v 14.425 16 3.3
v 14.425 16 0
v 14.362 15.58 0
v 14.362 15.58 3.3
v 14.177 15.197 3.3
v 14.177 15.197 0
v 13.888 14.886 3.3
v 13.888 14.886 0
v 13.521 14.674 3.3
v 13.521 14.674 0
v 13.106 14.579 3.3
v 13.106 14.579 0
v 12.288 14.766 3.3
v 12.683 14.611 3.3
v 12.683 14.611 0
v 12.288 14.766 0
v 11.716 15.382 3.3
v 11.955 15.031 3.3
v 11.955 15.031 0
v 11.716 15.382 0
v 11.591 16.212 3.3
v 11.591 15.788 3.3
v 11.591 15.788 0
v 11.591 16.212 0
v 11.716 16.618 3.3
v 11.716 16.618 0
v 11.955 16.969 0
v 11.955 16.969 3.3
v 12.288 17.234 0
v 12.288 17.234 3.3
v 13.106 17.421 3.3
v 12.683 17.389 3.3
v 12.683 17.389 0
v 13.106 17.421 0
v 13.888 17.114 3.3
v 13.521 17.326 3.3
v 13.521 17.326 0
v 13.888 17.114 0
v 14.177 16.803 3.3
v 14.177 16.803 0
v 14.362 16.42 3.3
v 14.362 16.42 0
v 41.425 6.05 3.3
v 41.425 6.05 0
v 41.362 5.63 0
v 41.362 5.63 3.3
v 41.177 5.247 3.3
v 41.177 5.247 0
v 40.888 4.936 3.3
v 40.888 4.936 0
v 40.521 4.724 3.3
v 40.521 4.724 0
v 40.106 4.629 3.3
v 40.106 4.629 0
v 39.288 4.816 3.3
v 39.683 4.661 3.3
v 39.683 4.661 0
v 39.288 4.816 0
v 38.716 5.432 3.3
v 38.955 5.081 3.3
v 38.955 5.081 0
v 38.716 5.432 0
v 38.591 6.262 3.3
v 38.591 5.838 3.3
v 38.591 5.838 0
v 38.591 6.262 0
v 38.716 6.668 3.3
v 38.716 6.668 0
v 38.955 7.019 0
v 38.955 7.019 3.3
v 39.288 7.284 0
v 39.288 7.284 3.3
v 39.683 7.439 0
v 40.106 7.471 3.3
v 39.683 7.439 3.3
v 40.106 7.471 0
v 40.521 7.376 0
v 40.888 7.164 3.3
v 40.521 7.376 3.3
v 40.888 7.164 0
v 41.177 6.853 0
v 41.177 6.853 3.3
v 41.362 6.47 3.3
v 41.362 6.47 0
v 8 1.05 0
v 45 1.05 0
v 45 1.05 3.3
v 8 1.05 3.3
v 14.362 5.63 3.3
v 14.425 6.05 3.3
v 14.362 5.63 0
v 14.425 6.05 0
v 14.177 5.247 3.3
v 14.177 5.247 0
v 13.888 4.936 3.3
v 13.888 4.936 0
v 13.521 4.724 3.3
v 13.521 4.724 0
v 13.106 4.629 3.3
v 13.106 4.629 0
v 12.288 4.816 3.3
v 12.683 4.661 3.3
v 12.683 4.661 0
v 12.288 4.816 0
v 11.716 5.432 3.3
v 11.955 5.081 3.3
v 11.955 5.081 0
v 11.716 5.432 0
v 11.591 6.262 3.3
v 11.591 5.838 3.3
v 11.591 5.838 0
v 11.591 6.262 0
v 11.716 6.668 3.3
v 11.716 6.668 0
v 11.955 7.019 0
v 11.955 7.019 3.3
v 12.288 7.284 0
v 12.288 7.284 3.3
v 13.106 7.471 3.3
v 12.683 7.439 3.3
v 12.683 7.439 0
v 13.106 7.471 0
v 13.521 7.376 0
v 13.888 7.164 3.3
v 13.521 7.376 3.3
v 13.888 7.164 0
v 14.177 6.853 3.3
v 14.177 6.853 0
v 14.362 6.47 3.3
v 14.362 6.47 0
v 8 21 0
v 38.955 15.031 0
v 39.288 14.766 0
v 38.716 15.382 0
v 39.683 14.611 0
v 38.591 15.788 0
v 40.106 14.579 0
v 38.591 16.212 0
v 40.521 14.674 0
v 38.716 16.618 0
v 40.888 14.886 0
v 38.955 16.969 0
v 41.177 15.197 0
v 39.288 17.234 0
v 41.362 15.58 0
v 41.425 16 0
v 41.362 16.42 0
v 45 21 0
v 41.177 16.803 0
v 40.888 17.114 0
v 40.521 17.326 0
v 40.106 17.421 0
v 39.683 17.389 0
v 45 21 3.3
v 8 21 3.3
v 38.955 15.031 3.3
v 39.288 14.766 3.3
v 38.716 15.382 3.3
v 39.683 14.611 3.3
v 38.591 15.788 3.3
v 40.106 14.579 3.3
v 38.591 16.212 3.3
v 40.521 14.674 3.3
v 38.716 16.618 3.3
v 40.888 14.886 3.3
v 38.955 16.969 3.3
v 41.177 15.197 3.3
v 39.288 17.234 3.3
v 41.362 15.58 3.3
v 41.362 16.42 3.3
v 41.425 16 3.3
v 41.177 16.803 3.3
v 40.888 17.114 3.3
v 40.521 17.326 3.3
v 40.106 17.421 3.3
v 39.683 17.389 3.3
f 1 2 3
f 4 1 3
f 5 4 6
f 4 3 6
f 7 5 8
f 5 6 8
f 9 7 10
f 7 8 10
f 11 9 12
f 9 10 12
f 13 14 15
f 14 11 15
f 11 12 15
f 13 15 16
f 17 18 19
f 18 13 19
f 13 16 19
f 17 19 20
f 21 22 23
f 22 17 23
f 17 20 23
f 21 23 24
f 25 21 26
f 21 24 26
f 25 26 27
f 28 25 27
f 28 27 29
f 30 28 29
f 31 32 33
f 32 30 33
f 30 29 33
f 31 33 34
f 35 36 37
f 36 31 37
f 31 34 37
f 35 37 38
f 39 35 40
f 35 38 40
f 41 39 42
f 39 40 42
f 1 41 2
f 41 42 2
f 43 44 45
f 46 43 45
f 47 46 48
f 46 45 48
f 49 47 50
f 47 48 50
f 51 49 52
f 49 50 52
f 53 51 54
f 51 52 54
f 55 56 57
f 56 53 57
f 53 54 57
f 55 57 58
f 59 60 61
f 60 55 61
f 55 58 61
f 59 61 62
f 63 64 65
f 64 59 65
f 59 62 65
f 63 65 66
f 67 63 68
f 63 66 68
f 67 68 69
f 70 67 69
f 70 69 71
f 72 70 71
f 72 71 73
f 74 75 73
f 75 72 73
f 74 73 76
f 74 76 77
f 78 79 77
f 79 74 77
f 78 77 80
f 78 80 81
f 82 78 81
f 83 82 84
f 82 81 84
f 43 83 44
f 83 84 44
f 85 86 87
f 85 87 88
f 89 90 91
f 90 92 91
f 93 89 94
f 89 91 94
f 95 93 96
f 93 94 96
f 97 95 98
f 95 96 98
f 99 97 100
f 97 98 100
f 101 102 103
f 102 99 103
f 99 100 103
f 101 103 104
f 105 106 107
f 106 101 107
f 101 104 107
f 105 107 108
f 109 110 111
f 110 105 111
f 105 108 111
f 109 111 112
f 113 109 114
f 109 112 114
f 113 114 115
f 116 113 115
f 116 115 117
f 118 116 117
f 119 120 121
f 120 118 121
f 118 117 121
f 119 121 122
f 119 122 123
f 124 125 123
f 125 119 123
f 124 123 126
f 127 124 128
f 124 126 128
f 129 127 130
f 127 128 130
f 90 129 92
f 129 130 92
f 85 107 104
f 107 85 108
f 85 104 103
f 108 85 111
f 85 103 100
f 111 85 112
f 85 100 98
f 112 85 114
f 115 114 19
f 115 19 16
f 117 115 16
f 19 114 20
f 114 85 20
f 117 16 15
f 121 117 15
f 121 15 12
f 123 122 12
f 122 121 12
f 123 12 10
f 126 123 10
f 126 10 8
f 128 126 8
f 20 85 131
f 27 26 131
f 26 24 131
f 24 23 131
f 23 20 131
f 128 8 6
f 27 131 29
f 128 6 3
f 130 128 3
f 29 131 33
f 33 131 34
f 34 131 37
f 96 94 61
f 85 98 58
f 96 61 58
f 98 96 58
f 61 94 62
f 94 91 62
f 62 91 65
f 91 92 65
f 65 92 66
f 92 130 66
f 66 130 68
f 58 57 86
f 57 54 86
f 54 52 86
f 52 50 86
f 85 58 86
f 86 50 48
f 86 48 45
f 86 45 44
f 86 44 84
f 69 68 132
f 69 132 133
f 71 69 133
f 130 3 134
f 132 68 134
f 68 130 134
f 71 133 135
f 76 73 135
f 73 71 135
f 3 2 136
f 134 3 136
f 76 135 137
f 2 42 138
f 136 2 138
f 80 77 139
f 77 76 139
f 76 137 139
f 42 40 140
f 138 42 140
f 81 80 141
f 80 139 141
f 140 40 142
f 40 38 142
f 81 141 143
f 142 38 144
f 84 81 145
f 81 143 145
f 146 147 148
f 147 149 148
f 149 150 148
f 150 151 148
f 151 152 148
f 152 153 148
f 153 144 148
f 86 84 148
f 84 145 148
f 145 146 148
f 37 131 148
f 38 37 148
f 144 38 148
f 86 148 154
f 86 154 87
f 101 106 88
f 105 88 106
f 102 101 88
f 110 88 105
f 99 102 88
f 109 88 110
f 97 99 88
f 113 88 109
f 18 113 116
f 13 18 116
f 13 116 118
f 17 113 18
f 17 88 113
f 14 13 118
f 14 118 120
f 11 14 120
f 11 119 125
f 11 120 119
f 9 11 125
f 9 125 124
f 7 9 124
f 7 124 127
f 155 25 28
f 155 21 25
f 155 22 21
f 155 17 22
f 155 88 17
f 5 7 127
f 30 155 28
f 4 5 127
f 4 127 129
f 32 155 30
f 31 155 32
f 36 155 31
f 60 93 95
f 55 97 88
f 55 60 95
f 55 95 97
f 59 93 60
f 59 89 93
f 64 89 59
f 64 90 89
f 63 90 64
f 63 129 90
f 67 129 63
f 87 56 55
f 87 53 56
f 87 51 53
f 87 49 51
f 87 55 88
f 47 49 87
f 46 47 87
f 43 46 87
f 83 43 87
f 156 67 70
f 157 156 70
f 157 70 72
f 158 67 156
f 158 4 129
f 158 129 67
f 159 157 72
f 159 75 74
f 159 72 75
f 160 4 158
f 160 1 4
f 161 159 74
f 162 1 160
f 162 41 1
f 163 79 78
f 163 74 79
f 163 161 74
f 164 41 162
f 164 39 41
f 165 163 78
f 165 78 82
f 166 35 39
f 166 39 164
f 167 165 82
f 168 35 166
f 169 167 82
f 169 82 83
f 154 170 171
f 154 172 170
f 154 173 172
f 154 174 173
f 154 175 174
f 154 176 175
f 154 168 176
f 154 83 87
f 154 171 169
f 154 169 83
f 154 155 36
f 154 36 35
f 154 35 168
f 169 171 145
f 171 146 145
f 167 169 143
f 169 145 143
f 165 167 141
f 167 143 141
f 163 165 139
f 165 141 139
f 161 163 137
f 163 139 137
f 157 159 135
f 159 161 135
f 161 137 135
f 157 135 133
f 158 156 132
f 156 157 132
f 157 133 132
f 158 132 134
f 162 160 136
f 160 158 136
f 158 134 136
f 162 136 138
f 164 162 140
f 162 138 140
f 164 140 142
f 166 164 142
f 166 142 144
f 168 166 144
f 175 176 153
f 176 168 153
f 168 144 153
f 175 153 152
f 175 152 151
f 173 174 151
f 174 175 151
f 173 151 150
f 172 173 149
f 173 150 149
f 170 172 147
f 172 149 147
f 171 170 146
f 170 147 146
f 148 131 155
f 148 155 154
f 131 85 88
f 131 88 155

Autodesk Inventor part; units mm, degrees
ref_plane "YZ Plane" through (0, 0, 0) normal (1, 0, 0) x (0, 1, 0)
ref_plane "XZ Plane" through (0, 0, 0) normal (0, 1, 0) x (-1, 0, 0)
ref_plane "XY Plane" through (0, 0, 0) normal (0, 0, 1) x (1, 0, 0)
sketch "Sketch1" plane through (0, 0, 0) normal (0, 0, 1) x (1, 0, 0)
  circle A0 centre (13, 16) radius 1.425
  circle A1 centre (13, 6.05) radius 1.425
  circle A2 centre (40, 6.05) radius 1.425
  circle A3 centre (40, 16) radius 1.425
  line L0 (45, 1.05) -> (8, 1.05)
  line L1 (8, 1.05) -> (8, 21)
  line L2 (8, 21) -> (45, 21)
  line L3 (45, 21) -> (45, 1.05)
  point P0 (0, 0)
  dimension "d24" = 9.95
  dimension "d27" = 9.95
  dimension "d31" = 5
  dimension "d32" = 5
  dimension "d33" = 5
  dimension "d34" = 5
  dimension "d40" = 5
  dimension "d41" = 5
  dimension "d42" = 5
  dimension "d43" = 27
extrude "Extrusion1" add sketch "Sketch1" along normal blind 3.3
properties part number "Muñeca2"
